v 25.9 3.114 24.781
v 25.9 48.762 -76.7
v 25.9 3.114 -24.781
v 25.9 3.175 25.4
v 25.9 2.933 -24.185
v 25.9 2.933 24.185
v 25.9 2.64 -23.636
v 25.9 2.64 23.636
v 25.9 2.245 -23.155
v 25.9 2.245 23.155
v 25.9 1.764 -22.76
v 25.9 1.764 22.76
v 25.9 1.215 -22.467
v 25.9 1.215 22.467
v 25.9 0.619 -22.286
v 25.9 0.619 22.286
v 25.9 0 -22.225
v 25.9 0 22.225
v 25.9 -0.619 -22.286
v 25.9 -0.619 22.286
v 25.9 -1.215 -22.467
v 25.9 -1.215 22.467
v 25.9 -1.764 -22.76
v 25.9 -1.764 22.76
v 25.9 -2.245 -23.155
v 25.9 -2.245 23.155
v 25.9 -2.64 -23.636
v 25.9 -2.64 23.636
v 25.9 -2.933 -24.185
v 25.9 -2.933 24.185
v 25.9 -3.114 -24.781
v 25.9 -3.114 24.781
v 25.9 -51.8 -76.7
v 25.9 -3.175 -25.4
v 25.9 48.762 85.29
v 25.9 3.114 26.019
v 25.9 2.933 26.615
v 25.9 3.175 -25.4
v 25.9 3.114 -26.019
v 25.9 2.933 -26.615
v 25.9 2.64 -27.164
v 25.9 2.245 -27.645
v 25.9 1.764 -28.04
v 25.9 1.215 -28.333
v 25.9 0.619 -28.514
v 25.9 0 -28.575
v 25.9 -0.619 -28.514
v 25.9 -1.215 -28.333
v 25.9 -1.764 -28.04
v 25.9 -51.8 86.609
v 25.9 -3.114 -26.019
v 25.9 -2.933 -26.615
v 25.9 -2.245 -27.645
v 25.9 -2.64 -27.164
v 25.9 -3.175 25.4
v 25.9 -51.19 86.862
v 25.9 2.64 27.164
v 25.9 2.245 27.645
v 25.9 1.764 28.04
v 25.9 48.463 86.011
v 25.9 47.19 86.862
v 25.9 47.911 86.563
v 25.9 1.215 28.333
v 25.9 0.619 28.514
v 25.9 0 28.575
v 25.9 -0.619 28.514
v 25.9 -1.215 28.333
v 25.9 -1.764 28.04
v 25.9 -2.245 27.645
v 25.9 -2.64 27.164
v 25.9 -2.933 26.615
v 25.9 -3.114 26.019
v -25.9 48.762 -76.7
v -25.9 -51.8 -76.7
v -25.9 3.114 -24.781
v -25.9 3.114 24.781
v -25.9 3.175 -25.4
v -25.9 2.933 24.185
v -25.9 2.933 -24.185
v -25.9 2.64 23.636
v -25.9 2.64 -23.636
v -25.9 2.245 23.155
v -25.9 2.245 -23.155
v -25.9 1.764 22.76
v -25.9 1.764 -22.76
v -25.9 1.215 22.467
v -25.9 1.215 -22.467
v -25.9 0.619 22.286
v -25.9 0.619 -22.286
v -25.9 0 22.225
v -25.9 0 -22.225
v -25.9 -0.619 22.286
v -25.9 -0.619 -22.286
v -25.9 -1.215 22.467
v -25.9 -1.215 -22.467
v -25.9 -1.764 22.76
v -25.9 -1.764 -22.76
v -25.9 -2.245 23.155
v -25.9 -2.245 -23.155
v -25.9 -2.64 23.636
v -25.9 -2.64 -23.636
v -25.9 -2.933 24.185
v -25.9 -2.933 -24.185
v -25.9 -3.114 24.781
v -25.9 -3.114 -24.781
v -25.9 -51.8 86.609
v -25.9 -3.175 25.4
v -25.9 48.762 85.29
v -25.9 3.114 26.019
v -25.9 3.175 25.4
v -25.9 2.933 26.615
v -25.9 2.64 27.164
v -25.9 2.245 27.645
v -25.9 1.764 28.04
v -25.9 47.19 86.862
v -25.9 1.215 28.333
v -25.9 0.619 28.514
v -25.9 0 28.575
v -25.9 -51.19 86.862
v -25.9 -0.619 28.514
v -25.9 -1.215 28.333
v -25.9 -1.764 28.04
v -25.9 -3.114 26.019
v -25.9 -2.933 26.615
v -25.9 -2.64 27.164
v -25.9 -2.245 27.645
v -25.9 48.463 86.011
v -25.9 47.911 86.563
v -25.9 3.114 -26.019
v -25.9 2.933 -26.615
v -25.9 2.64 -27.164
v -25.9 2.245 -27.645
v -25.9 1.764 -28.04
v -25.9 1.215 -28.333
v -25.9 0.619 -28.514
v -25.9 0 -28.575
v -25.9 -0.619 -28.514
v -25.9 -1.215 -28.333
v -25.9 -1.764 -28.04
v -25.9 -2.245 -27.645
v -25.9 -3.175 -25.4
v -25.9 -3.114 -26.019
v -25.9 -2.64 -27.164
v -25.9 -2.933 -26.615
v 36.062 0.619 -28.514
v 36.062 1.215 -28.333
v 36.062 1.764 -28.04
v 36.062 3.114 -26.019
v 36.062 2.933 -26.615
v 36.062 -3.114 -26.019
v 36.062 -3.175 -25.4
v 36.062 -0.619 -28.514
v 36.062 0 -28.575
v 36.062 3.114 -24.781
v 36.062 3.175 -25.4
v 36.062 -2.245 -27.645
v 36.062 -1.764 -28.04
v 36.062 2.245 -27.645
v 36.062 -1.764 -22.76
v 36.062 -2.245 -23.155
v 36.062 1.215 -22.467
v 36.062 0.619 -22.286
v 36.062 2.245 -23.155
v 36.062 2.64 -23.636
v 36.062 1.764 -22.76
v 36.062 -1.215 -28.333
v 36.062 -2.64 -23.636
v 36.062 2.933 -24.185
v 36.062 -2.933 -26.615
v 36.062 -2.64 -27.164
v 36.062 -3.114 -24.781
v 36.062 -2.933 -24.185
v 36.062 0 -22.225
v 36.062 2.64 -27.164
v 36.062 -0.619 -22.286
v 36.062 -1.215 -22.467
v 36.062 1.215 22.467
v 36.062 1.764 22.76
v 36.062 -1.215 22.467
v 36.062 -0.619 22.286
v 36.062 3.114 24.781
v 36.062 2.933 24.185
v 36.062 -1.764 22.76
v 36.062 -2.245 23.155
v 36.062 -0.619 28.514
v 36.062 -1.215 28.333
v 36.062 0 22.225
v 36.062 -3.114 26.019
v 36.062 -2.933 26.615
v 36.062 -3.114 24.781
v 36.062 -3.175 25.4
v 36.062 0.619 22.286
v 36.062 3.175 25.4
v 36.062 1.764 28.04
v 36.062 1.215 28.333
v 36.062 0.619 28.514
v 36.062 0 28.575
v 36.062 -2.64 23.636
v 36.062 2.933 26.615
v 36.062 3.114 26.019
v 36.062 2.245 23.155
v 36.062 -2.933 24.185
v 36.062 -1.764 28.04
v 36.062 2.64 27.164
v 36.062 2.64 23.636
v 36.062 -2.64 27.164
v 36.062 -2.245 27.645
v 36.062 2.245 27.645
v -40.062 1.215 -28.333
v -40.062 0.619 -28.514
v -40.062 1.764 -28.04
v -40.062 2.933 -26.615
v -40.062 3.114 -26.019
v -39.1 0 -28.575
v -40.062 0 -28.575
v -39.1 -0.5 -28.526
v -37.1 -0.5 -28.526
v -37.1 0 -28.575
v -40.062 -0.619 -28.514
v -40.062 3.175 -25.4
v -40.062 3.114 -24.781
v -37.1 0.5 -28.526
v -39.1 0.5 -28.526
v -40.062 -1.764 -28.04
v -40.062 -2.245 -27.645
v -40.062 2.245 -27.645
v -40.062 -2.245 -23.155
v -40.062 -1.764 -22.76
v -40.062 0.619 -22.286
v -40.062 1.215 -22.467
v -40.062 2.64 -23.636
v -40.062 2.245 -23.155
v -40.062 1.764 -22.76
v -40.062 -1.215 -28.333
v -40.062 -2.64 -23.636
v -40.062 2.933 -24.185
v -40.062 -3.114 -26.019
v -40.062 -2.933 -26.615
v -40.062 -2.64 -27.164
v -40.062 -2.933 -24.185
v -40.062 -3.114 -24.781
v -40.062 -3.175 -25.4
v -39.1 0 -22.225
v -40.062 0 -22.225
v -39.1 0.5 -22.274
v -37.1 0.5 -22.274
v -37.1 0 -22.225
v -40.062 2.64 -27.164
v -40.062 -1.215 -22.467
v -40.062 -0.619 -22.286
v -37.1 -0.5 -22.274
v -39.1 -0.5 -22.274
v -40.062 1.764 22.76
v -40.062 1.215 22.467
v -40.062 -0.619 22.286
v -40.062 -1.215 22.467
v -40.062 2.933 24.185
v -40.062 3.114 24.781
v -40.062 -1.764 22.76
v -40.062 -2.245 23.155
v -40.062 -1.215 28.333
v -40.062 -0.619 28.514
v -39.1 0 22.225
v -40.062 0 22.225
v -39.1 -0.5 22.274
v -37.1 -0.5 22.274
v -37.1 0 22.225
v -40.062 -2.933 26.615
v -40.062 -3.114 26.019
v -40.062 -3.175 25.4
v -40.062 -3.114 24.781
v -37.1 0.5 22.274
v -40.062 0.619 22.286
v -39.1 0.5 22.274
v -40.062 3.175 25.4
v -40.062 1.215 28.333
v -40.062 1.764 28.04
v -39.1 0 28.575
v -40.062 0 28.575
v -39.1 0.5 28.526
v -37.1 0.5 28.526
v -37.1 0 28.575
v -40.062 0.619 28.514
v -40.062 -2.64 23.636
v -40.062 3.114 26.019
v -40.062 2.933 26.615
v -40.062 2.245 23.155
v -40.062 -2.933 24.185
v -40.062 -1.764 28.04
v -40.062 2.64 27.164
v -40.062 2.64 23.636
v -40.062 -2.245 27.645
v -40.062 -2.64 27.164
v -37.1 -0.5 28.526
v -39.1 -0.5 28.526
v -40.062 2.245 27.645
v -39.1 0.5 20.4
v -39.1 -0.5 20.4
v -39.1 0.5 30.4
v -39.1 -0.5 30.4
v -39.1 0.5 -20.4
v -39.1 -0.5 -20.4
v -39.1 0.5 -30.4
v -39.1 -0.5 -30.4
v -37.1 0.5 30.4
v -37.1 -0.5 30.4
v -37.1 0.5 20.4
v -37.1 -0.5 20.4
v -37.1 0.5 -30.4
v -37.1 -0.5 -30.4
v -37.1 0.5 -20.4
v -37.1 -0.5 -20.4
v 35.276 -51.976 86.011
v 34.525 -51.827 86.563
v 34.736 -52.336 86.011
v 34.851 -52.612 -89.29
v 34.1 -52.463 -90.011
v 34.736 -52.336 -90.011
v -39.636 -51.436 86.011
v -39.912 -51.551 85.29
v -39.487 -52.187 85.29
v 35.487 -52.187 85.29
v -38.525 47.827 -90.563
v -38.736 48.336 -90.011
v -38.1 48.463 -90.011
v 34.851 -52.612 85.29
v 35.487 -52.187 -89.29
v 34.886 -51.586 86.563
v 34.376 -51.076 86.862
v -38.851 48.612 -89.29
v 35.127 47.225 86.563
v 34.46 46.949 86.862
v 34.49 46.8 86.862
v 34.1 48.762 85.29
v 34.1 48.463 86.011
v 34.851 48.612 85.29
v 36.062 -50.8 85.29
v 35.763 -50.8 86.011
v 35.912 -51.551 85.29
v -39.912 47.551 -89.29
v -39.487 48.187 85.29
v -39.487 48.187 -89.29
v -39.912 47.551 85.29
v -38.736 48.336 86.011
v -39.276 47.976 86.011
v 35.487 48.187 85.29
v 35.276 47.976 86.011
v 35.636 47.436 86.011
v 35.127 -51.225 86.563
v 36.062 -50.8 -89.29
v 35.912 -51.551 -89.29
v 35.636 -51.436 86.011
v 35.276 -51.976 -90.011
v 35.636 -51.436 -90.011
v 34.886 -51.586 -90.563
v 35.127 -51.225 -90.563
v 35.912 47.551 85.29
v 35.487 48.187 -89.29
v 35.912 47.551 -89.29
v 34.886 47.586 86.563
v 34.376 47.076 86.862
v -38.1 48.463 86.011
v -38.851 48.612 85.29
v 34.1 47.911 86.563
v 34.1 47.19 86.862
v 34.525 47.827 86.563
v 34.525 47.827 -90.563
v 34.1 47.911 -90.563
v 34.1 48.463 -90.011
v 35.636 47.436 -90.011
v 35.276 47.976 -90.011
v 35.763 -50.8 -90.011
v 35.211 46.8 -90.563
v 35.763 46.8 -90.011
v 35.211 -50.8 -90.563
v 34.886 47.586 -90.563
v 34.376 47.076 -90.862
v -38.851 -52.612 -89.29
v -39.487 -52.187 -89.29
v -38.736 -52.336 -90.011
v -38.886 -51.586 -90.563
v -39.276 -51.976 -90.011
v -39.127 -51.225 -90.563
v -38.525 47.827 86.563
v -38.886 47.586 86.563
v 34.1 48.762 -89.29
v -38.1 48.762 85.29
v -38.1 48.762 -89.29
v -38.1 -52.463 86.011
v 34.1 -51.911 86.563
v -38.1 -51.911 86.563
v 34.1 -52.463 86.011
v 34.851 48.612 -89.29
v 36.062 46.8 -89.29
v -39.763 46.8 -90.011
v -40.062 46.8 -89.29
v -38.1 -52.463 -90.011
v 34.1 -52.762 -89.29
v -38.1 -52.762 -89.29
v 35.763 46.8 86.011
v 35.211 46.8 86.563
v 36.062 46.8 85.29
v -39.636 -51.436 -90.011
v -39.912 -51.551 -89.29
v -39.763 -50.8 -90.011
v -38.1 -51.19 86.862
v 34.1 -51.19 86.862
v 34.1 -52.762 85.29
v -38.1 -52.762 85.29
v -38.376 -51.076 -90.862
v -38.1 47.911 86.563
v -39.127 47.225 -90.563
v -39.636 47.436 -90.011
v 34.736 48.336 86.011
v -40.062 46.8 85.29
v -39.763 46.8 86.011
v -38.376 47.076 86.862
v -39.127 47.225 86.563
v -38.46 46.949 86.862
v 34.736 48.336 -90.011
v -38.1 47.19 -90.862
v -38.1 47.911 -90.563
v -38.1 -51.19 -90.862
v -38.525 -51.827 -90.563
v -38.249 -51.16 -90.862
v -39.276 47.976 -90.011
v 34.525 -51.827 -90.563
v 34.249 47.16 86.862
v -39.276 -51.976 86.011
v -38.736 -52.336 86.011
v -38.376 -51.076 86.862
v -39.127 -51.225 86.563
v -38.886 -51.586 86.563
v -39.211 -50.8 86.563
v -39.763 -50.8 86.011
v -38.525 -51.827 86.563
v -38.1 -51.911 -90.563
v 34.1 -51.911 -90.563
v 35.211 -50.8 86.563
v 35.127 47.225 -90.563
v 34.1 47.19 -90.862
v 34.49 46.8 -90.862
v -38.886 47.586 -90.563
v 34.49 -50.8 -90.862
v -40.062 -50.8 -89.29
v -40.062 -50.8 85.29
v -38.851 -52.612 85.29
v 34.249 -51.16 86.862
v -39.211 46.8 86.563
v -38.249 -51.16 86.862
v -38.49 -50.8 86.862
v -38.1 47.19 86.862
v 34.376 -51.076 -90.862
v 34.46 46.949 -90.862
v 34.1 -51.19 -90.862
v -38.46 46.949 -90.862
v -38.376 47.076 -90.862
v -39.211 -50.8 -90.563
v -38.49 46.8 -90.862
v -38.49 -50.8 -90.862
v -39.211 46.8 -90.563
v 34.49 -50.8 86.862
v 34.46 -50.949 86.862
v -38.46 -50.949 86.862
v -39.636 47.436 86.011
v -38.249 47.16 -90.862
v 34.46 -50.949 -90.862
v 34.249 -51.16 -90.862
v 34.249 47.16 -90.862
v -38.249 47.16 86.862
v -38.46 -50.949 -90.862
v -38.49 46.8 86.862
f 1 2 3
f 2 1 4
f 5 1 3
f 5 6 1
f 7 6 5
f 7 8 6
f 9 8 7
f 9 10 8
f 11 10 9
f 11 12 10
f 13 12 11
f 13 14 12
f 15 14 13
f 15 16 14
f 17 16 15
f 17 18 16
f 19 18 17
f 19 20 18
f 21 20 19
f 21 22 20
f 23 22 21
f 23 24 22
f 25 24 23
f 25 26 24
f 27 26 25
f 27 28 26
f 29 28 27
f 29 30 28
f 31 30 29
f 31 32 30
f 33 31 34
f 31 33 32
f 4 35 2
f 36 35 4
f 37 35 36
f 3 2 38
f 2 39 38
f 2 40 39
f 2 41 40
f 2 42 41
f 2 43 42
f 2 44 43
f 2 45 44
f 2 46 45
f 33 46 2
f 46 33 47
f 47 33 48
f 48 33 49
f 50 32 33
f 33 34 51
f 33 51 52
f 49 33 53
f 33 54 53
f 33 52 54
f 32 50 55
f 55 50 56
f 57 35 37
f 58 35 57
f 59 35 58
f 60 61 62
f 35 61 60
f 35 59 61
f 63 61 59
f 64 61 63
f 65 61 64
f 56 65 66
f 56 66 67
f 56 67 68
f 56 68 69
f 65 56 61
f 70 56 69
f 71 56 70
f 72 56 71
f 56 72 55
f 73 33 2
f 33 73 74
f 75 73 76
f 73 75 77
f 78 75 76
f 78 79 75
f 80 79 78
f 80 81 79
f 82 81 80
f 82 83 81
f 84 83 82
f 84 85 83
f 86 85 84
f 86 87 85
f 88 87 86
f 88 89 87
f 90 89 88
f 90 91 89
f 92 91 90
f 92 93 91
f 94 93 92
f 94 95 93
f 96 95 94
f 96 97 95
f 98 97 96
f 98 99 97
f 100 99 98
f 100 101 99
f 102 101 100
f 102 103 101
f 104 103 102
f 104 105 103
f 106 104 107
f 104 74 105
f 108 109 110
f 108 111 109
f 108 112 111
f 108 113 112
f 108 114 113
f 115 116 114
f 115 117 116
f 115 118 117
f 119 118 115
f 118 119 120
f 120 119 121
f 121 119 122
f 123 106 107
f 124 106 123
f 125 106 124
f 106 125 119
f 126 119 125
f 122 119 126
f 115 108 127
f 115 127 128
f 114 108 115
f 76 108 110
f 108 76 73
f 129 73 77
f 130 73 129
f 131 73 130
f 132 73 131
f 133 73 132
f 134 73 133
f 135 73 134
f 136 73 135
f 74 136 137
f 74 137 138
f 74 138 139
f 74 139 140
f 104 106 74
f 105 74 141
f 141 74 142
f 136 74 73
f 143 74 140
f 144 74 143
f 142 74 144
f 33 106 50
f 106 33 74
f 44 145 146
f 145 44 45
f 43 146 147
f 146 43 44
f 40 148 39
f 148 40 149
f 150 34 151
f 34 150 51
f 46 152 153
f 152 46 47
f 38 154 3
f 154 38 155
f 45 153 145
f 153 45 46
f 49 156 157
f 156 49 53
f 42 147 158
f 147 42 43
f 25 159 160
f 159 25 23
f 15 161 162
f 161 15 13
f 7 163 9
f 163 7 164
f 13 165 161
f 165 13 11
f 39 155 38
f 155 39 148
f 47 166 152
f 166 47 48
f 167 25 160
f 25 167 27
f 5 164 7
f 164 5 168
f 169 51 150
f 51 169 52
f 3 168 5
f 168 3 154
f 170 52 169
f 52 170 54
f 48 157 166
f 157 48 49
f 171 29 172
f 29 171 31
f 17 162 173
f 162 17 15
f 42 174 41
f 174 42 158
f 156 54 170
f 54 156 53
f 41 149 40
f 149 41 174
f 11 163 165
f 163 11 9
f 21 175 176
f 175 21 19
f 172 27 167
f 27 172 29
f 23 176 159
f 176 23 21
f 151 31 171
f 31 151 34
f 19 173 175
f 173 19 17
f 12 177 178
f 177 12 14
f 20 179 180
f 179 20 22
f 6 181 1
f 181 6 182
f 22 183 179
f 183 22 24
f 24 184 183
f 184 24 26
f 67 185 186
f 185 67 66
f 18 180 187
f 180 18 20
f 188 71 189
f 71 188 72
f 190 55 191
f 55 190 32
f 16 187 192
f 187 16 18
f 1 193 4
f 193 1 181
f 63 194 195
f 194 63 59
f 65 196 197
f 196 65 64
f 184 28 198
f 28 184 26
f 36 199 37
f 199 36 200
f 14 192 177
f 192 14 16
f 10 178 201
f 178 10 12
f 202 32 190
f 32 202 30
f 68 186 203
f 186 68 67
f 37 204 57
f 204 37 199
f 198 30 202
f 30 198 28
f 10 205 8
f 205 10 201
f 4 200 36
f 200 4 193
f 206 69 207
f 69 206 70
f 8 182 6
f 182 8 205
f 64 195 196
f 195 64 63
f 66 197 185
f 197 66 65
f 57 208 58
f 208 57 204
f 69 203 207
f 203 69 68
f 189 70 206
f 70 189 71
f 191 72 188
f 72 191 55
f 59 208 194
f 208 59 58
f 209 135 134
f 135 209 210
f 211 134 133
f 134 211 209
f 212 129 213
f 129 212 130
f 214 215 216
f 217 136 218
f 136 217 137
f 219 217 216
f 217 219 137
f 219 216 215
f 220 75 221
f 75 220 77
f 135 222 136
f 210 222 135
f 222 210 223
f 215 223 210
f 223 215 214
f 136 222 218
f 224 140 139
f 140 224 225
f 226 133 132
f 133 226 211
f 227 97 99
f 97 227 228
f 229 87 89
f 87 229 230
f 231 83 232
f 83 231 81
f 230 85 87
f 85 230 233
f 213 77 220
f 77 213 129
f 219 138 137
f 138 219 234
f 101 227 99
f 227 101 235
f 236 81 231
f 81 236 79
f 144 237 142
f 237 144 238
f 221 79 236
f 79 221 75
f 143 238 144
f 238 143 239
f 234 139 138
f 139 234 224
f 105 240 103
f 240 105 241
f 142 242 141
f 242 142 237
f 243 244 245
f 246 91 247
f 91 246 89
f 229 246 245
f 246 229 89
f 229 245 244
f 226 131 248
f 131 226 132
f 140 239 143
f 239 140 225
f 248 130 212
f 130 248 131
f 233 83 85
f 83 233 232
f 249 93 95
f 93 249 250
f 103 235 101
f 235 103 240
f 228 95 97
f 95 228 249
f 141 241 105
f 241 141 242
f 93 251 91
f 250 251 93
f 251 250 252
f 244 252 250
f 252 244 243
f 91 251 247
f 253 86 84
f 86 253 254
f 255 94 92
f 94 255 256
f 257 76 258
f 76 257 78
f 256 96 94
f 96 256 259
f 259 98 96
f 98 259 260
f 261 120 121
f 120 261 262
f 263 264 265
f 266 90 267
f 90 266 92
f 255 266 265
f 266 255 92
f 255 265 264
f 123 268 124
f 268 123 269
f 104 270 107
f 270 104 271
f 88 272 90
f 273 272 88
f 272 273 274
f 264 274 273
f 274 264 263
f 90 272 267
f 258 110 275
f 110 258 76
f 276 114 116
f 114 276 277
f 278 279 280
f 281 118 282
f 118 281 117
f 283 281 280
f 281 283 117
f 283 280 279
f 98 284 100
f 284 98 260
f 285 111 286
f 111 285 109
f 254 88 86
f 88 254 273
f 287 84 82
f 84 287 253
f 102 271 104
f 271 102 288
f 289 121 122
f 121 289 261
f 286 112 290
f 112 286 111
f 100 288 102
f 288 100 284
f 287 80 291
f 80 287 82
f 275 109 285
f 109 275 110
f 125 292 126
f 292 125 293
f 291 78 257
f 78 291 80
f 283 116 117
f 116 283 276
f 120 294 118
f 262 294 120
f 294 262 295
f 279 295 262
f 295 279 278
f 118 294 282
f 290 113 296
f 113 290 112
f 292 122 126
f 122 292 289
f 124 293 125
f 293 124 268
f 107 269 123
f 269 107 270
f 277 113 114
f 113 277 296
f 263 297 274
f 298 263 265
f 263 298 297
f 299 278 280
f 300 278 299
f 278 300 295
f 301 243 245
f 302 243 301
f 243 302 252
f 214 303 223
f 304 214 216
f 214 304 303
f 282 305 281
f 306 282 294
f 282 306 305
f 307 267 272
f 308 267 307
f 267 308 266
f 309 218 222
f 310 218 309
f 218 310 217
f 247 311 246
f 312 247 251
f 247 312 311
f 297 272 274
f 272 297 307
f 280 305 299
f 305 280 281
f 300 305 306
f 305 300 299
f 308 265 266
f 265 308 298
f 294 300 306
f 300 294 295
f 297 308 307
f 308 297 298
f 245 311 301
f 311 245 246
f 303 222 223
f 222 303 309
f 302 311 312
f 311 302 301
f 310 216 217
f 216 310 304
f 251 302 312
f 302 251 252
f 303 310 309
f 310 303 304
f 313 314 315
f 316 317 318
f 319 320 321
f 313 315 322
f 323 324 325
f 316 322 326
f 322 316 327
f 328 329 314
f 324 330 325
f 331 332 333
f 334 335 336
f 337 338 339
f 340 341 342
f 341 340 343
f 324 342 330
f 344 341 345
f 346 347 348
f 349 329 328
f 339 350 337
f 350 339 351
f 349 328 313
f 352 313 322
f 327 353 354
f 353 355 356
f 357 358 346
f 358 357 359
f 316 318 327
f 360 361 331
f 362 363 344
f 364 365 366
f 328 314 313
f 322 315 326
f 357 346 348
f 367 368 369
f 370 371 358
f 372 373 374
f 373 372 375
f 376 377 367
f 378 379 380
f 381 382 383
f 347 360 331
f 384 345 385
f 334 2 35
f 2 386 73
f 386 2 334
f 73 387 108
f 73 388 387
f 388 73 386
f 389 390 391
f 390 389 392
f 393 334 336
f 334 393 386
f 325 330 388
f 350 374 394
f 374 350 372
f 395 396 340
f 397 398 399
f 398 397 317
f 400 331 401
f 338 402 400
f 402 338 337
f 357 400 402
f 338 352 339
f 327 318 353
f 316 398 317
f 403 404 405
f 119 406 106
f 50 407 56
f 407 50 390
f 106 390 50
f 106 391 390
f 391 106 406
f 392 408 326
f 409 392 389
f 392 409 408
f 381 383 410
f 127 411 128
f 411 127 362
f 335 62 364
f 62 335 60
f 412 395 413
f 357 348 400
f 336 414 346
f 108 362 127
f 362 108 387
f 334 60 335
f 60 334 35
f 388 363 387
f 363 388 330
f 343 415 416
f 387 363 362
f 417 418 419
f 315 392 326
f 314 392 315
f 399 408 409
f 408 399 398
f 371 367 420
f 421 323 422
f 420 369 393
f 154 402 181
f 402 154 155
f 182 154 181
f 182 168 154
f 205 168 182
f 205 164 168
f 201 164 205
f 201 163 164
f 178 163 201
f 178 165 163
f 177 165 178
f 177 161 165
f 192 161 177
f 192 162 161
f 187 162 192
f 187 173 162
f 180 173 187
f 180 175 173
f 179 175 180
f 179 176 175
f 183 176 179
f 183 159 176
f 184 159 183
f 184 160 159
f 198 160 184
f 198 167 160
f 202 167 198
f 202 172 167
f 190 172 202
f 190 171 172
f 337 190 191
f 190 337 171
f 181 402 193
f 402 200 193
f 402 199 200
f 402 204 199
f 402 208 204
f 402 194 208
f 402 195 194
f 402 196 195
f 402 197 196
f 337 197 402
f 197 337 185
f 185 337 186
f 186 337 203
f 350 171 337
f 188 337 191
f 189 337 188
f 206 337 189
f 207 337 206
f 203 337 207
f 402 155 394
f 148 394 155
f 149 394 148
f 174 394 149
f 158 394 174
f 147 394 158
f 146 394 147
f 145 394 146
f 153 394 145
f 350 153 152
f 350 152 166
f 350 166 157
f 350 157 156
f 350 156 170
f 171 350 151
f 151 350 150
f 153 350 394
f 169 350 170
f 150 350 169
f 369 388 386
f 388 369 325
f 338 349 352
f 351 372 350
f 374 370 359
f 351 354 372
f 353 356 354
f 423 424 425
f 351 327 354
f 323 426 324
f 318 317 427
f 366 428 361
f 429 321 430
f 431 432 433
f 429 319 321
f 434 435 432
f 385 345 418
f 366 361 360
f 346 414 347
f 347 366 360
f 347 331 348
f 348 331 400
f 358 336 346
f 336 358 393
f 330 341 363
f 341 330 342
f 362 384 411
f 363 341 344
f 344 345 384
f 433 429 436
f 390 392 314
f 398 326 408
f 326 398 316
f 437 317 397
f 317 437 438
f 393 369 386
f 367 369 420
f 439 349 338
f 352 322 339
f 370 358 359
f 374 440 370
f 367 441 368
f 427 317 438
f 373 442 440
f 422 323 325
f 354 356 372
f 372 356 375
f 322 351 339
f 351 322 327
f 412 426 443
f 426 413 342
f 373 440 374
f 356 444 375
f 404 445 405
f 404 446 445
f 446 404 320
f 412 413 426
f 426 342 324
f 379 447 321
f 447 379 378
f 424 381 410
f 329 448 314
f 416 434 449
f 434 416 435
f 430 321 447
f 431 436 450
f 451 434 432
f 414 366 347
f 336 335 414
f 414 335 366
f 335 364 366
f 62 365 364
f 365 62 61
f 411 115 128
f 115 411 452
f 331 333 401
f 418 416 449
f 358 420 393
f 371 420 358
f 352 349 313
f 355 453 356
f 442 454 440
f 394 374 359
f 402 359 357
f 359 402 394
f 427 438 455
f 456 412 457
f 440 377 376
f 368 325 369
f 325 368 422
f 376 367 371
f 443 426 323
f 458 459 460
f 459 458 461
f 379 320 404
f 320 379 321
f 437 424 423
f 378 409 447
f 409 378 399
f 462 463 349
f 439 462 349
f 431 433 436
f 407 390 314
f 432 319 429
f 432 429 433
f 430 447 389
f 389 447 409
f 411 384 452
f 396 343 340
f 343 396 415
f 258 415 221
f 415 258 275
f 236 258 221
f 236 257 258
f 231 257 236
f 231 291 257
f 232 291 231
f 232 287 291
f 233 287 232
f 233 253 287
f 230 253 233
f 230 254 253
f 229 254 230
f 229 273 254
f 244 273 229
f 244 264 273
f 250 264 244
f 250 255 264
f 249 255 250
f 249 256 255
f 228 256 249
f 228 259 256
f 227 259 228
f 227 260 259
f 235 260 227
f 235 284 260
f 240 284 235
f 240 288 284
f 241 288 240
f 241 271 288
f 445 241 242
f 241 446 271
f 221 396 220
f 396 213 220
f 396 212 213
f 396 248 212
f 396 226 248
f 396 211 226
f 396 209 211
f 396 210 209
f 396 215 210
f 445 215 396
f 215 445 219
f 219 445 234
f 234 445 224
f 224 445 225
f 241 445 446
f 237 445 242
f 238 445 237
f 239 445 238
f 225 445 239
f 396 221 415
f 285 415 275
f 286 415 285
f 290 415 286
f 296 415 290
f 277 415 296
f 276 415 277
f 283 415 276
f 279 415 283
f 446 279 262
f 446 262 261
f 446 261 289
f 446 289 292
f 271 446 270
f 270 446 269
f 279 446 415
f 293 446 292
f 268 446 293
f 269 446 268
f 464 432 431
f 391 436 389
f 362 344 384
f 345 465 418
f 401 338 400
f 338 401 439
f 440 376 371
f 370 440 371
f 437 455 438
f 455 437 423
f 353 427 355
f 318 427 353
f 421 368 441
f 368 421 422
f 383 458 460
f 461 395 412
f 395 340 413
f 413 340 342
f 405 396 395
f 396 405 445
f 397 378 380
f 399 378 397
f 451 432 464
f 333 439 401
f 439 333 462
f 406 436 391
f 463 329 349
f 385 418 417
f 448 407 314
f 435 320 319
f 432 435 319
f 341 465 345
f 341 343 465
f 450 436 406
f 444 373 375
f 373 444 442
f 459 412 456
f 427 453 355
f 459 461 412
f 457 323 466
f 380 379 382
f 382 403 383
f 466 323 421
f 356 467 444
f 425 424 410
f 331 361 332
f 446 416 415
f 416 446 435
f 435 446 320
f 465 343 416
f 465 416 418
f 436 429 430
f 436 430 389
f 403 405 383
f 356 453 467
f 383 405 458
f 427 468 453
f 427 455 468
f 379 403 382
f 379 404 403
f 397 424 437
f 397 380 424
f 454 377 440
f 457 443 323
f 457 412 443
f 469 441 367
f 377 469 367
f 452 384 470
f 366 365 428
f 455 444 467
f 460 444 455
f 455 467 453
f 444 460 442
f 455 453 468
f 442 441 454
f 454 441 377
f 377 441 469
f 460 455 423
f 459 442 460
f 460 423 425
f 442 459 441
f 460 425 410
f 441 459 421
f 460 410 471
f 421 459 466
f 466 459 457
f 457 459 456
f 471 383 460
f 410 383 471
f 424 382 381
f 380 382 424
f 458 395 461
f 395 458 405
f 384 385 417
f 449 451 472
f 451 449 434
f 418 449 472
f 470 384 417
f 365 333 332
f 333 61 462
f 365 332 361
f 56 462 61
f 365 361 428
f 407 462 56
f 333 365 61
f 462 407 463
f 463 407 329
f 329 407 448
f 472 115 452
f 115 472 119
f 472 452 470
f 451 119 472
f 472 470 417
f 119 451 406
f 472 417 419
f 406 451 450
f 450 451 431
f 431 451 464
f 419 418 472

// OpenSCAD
// tube_drilling_jig.scad
// 3D Printable Drilling Jig for 2x6 Rectangular Tubing
// LifeTrac v25 - Open Source Ecology
// License: GPL v3
//
// PURPOSE:
// This jig wraps around 2x6 rectangular tubing and provides accurately positioned
// holes for marking the centers of angle iron mounting holes. The jig includes
// alignment marks for tape measure reference.
//
// USAGE:
// 1. Print 4-6 copies of this jig (for marking all holes simultaneously)
// 2. Slide jig onto 2x6 tube at the desired position
// 3. Align the center reference mark with tape measure from tube end or other holes
// 4. Use a marker through the guide holes to mark hole centers, OR
// 5. Use a center punch (1/4" OD recommended) through the guide holes
// 6. Remove jig and drill marked holes
//
// HOLE PATTERN:
// The jig marks holes for 2"x2" angle iron brackets that mount the 2x6 cross
// frame tubes to the side wall plates. Two holes per side, spaced 2" apart
// vertically (for tube face) and positioned 1" from the angle corner.

// Try to import params, but provide defaults if not available
include <../lifetrac_v25_params.scad>

// =============================================================================
// JIG PARAMETERS
// =============================================================================

// Tube dimensions - 2"x6" rectangular tubing with 1/4" wall
// TUBE_2X6_1_4 = [50.8, 152.4, 6.35] from params (width, height, wall)
_TUBE_WIDTH = is_undef(TUBE_2X6_1_4) ? 50.8 : TUBE_2X6_1_4[0];    // 2" = 50.8mm
_TUBE_HEIGHT = is_undef(TUBE_2X6_1_4) ? 152.4 : TUBE_2X6_1_4[1];  // 6" = 152.4mm

// Jig clearance (gap between jig inner surface and tube outer surface)
JIG_CLEARANCE = 0.5;  // 0.5mm clearance for easy sliding fit

// Jig wall thickness
JIG_WALL = 4.0;  // 4mm walls for strength

// Jig length along tube axis
JIG_LENGTH = 101.6;  // 4 inches = 101.6mm

// Inner dimensions (tube + clearance)
JIG_INNER_WIDTH = _TUBE_WIDTH + 2*JIG_CLEARANCE;    // ~51.8mm
JIG_INNER_HEIGHT = _TUBE_HEIGHT + 2*JIG_CLEARANCE;  // ~153.4mm

// Outer dimensions (per user request: approximately 3" x 7")
JIG_OUTER_WIDTH = JIG_INNER_WIDTH + 2*JIG_WALL;     // ~59.8mm ≈ 2.4"
JIG_OUTER_HEIGHT = JIG_INNER_HEIGHT + 2*JIG_WALL;   // ~161.4mm ≈ 6.4"

// Actual outer dimensions (can be increased to match user request)
// User requested ~3" x 7" outer dimensions
JIG_OUTER_WIDTH_FINAL = 76.2;   // 3 inches
JIG_OUTER_HEIGHT_FINAL = 177.8; // 7 inches

// Recalculate wall thickness to achieve requested outer dimensions
JIG_WALL_X = (JIG_OUTER_WIDTH_FINAL - JIG_INNER_WIDTH) / 2;   // ~12.2mm
JIG_WALL_Z = (JIG_OUTER_HEIGHT_FINAL - JIG_INNER_HEIGHT) / 2; // ~12.2mm

// =============================================================================
// HOLE PATTERN PARAMETERS
// Based on frame_tube_angle_iron() in lifetrac_v25.scad
// =============================================================================

// Bolt hole diameter - 1/2" bolts (12.7mm) with clearance for marker/punch
BOLT_DIA = is_undef(BOLT_DIA_1_2) ? 12.7 : BOLT_DIA_1_2;

// Guide hole diameter - sized for 1/4" OD center punch (6.35mm)
// or use larger for marker tip
PUNCH_GUIDE_DIA = 6.35;    // 1/4" = 6.35mm (for center punch)
MARKER_GUIDE_DIA = 9.525;  // 3/8" = 9.525mm (for marker tip)

// Default guide hole size (use punch size, user can scale if needed)
GUIDE_HOLE_DIA = PUNCH_GUIDE_DIA;

// Hole spacing on tube face (from angle iron mounting pattern)
// Two holes spaced 2" apart vertically, centered on tube height
TUBE_HOLE_SPACING = 50.8;  // 2 inches between holes
TUBE_HOLE_OFFSET = 25.4;   // 1" from tube center (each direction)

// Hole position from tube edge (angle corner to hole center)
HOLE_INSET = 25.4;  // 1 inch from corner/edge

// =============================================================================
// ALIGNMENT MARK PARAMETERS
// =============================================================================

// Reference marks depth (engraved into surface)
MARK_DEPTH = 1.0;  // 1mm deep engraving
MARK_WIDTH = 1.0;  // 1mm wide lines

// Center cross size
CENTER_CROSS_LENGTH = 20;  // 20mm long arms

// Text height
TEXT_HEIGHT = 6;   // 6mm tall text
TEXT_DEPTH = 0.8;  // 0.8mm deep engraving

// =============================================================================
// RENDER OPTIONS
// =============================================================================

$fn = 32;

// Set to true to show the tube inside the jig (for visualization)
SHOW_TUBE = false;

// =============================================================================
// MAIN JIG MODULE
// =============================================================================

module tube_drilling_jig() {
    difference() {
        // Main jig body
        jig_body();
        
        // Subtract tube cavity
        tube_cavity();
        
        // Subtract guide holes on both narrow sides (tube faces)
        guide_holes();
        
        // Subtract alignment marks
        alignment_marks();
    }
}

// Outer shell of the jig
module jig_body() {
    // Centered on tube, extending in Y direction (along tube axis)
    translate([-JIG_OUTER_WIDTH_FINAL/2, -JIG_LENGTH/2, -JIG_OUTER_HEIGHT_FINAL/2])
    difference() {
        // Solid block with rounded corners for comfortable handling
        minkowski() {
            cube([JIG_OUTER_WIDTH_FINAL - 4, JIG_LENGTH - 4, JIG_OUTER_HEIGHT_FINAL - 4]);
            sphere(r=2, $fn=16);
        }
    }
}

// Tube-shaped cavity (U-shape that wraps around tube)
module tube_cavity() {
    // Main tube cavity - runs full length
    // The tube is 2"W x 6"H, jig wraps around the 6" tall sides
    // Opening is on the wide (6") face to slide over tube easily
    translate([-JIG_INNER_WIDTH/2, -JIG_LENGTH/2 - 1, -JIG_INNER_HEIGHT/2])
    cube([JIG_INNER_WIDTH, JIG_LENGTH + 2, JIG_INNER_HEIGHT]);
    
    // Opening slot on TOP (one of the 6" wide faces) to slide jig onto tube
    // The slot needs to be wide enough to pass over the 2" tube width
    // Make it exactly the tube width plus clearance
    slot_width = JIG_INNER_WIDTH;  // Full tube width for the slot
    translate([-slot_width/2, -JIG_LENGTH/2 - 1, JIG_INNER_HEIGHT/2 - JIG_CLEARANCE])
    cube([slot_width, JIG_LENGTH + 2, JIG_OUTER_HEIGHT_FINAL]);
}

// Guide holes for marking drill positions
module guide_holes() {
    // Holes are on the narrow faces (2" faces) of the tube
    // Two holes per face, spaced 2" apart vertically
    
    // Positive X face (right side when looking at tube end)
    for (z_offset = [-TUBE_HOLE_OFFSET, TUBE_HOLE_OFFSET]) {
        translate([JIG_INNER_WIDTH/2 - 1, 0, z_offset])
        rotate([0, 90, 0])
        cylinder(d=GUIDE_HOLE_DIA, h=JIG_WALL_X + 10);
    }
    
    // Negative X face (left side when looking at tube end)
    for (z_offset = [-TUBE_HOLE_OFFSET, TUBE_HOLE_OFFSET]) {
        translate([-JIG_INNER_WIDTH/2 - JIG_WALL_X - 5, 0, z_offset])
        rotate([0, 90, 0])
        cylinder(d=GUIDE_HOLE_DIA, h=JIG_WALL_X + 10);
    }
}

// Alignment marks for measurement reference
module alignment_marks() {
    // Center line mark on top surface (for tape measure alignment)
    // Y=0 is the center reference point
    
    // Top surface center cross
    translate([0, 0, JIG_OUTER_HEIGHT_FINAL/2 - MARK_DEPTH])
    linear_extrude(height=MARK_DEPTH + 1) {
        // Horizontal line (across tube width)
        translate([-CENTER_CROSS_LENGTH/2, -MARK_WIDTH/2])
        square([CENTER_CROSS_LENGTH, MARK_WIDTH]);
        // Vertical line (along tube length)
        translate([-MARK_WIDTH/2, -CENTER_CROSS_LENGTH/2])
        square([MARK_WIDTH, CENTER_CROSS_LENGTH]);
    }
    
    // Reference text on top surface
    translate([0, -JIG_LENGTH/4, JIG_OUTER_HEIGHT_FINAL/2 - TEXT_DEPTH])
    linear_extrude(height=TEXT_DEPTH + 1)
    text("CENTER", size=TEXT_HEIGHT, halign="center", valign="center", font="Liberation Sans:style=Bold");
    
    // Side marks showing hole positions relative to center
    // Each hole has a small arrow or line pointing to it
    
    // Right side (+X) marks
    translate([JIG_OUTER_WIDTH_FINAL/2 - MARK_DEPTH, 0, 0])
    rotate([0, 90, 0])
    linear_extrude(height=MARK_DEPTH + 1) {
        // Upper hole marker
        translate([-TUBE_HOLE_OFFSET - 5, -MARK_WIDTH/2])
        square([10, MARK_WIDTH]);
        // Lower hole marker  
        translate([TUBE_HOLE_OFFSET - 5, -MARK_WIDTH/2])
        square([10, MARK_WIDTH]);
    }
    
    // Left side (-X) marks
    translate([-JIG_OUTER_WIDTH_FINAL/2 - 1, 0, 0])
    rotate([0, 90, 0])
    linear_extrude(height=MARK_DEPTH + 1) {
        // Upper hole marker
        translate([-TUBE_HOLE_OFFSET - 5, -MARK_WIDTH/2])
        square([10, MARK_WIDTH]);
        // Lower hole marker
        translate([TUBE_HOLE_OFFSET - 5, -MARK_WIDTH/2])
        square([10, MARK_WIDTH]);
    }
    
    // Distance labels on front face
    translate([0, JIG_LENGTH/2 - TEXT_DEPTH, 0])
    rotate([90, 0, 0])
    linear_extrude(height=TEXT_DEPTH + 1) {
        // Upper hole distance (1" from center)
        translate([JIG_OUTER_WIDTH_FINAL/4, TUBE_HOLE_OFFSET])
        text("1\"", size=TEXT_HEIGHT*0.8, halign="center", valign="center", font="Liberation Sans");
        // Lower hole distance (1" from center)
        translate([JIG_OUTER_WIDTH_FINAL/4, -TUBE_HOLE_OFFSET])
        text("1\"", size=TEXT_HEIGHT*0.8, halign="center", valign="center", font="Liberation Sans");
    }
}

// Visualization of the tube inside the jig
module tube_visualization() {
    if (SHOW_TUBE) {
        color("SteelBlue", 0.3)
        translate([-_TUBE_WIDTH/2, -JIG_LENGTH*0.75, -_TUBE_HEIGHT/2])
        cube([_TUBE_WIDTH, JIG_LENGTH*1.5, _TUBE_HEIGHT]);
    }
}

// =============================================================================
// ALTERNATIVE DESIGNS
// =============================================================================

// Version with larger holes for marker use
module tube_drilling_jig_marker_version() {
    difference() {
        jig_body();
        tube_cavity();
        
        // Larger guide holes for marker tips
        // Positive X face
        for (z_offset = [-TUBE_HOLE_OFFSET, TUBE_HOLE_OFFSET]) {
            translate([JIG_INNER_WIDTH/2 - 1, 0, z_offset])
            rotate([0, 90, 0])
            cylinder(d=MARKER_GUIDE_DIA, h=JIG_WALL_X + 10);
        }
        
        // Negative X face
        for (z_offset = [-TUBE_HOLE_OFFSET, TUBE_HOLE_OFFSET]) {
            translate([-JIG_INNER_WIDTH/2 - JIG_WALL_X - 5, 0, z_offset])
            rotate([0, 90, 0])
            cylinder(d=MARKER_GUIDE_DIA, h=JIG_WALL_X + 10);
        }
        
        alignment_marks();
    }
}

// Minimal version - less material, faster to print
module tube_drilling_jig_minimal() {
    min_wall = 3;  // Thinner walls
    min_length = 50.8;  // 2" long instead of 4"
    
    difference() {
        // Smaller body
        translate([-(JIG_INNER_WIDTH/2 + min_wall), -min_length/2, -(JIG_INNER_HEIGHT/2 + min_wall)])
        cube([JIG_INNER_WIDTH + 2*min_wall, min_length, JIG_INNER_HEIGHT + 2*min_wall]);
        
        // Tube cavity
        translate([-JIG_INNER_WIDTH/2, -min_length/2 - 1, -JIG_INNER_HEIGHT/2])
        cube([JIG_INNER_WIDTH, min_length + 2, JIG_INNER_HEIGHT]);
        
        // Top opening - full width to slide over tube
        translate([-JIG_INNER_WIDTH/2, -min_length/2 - 1, JIG_INNER_HEIGHT/2 - JIG_CLEARANCE])
        cube([JIG_INNER_WIDTH, min_length + 2, JIG_INNER_HEIGHT]);
        
        // Guide holes
        for (z_offset = [-TUBE_HOLE_OFFSET, TUBE_HOLE_OFFSET]) {
            // Right side
            translate([JIG_INNER_WIDTH/2 - 1, 0, z_offset])
            rotate([0, 90, 0])
            cylinder(d=GUIDE_HOLE_DIA, h=min_wall + 10);
            // Left side
            translate([-JIG_INNER_WIDTH/2 - min_wall - 5, 0, z_offset])
            rotate([0, 90, 0])
            cylinder(d=GUIDE_HOLE_DIA, h=min_wall + 10);
        }
    }
}

// =============================================================================
// RENDER
// =============================================================================

// Main jig (uncomment the version you want to render)
tube_drilling_jig();
// tube_drilling_jig_marker_version();
// tube_drilling_jig_minimal();

// Show tube for reference (set SHOW_TUBE = true above)
tube_visualization();

// =============================================================================
// ASSEMBLY NOTES
// =============================================================================
/*
PRINTING RECOMMENDATIONS:
- Material: PLA or PETG
- Layer height: 0.2mm
- Infill: 20-30%
- Walls: 3 perimeters minimum
- Supports: May be needed for the cavity overhang
- Orientation: Print with opening facing up (standing on the 7" face)

RECOMMENDED QUANTITY:
Print 4-6 jigs to mark all holes on a tube simultaneously:
- 2 jigs per tube face × 2 faces = 4 jigs minimum
- Extra jigs allow marking multiple positions without moving jigs

USAGE INSTRUCTIONS:
1. Measure and mark the Y position (along tube length) for each jig
2. Slide jigs onto tube, aligning CENTER mark with your measurement
3. The jigs will self-align to the tube faces
4. Through each guide hole, either:
   a) Insert marker and make a dot at center
   b) Insert center punch (1/4" OD) and tap with hammer
5. Remove jigs and drill at marked centers

HOLE PATTERN DETAILS:
- 4 holes total per jig position (2 per narrow face)
- Holes are 2" (50.8mm) apart vertically
- Holes are centered on the 6" face height
- Pattern matches 2"x2"x1/4" angle iron mounting
- Use 1/2" (12.7mm) drill bit for final holes

CUSTOMIZATION:
- Adjust GUIDE_HOLE_DIA for different punch/marker sizes
- Use tube_drilling_jig_marker_version() for larger marker holes
- Use tube_drilling_jig_minimal() for faster printing
- Set JIG_CLEARANCE tighter (0.3mm) for snug fit or looser (0.8mm) for easy sliding
*/
